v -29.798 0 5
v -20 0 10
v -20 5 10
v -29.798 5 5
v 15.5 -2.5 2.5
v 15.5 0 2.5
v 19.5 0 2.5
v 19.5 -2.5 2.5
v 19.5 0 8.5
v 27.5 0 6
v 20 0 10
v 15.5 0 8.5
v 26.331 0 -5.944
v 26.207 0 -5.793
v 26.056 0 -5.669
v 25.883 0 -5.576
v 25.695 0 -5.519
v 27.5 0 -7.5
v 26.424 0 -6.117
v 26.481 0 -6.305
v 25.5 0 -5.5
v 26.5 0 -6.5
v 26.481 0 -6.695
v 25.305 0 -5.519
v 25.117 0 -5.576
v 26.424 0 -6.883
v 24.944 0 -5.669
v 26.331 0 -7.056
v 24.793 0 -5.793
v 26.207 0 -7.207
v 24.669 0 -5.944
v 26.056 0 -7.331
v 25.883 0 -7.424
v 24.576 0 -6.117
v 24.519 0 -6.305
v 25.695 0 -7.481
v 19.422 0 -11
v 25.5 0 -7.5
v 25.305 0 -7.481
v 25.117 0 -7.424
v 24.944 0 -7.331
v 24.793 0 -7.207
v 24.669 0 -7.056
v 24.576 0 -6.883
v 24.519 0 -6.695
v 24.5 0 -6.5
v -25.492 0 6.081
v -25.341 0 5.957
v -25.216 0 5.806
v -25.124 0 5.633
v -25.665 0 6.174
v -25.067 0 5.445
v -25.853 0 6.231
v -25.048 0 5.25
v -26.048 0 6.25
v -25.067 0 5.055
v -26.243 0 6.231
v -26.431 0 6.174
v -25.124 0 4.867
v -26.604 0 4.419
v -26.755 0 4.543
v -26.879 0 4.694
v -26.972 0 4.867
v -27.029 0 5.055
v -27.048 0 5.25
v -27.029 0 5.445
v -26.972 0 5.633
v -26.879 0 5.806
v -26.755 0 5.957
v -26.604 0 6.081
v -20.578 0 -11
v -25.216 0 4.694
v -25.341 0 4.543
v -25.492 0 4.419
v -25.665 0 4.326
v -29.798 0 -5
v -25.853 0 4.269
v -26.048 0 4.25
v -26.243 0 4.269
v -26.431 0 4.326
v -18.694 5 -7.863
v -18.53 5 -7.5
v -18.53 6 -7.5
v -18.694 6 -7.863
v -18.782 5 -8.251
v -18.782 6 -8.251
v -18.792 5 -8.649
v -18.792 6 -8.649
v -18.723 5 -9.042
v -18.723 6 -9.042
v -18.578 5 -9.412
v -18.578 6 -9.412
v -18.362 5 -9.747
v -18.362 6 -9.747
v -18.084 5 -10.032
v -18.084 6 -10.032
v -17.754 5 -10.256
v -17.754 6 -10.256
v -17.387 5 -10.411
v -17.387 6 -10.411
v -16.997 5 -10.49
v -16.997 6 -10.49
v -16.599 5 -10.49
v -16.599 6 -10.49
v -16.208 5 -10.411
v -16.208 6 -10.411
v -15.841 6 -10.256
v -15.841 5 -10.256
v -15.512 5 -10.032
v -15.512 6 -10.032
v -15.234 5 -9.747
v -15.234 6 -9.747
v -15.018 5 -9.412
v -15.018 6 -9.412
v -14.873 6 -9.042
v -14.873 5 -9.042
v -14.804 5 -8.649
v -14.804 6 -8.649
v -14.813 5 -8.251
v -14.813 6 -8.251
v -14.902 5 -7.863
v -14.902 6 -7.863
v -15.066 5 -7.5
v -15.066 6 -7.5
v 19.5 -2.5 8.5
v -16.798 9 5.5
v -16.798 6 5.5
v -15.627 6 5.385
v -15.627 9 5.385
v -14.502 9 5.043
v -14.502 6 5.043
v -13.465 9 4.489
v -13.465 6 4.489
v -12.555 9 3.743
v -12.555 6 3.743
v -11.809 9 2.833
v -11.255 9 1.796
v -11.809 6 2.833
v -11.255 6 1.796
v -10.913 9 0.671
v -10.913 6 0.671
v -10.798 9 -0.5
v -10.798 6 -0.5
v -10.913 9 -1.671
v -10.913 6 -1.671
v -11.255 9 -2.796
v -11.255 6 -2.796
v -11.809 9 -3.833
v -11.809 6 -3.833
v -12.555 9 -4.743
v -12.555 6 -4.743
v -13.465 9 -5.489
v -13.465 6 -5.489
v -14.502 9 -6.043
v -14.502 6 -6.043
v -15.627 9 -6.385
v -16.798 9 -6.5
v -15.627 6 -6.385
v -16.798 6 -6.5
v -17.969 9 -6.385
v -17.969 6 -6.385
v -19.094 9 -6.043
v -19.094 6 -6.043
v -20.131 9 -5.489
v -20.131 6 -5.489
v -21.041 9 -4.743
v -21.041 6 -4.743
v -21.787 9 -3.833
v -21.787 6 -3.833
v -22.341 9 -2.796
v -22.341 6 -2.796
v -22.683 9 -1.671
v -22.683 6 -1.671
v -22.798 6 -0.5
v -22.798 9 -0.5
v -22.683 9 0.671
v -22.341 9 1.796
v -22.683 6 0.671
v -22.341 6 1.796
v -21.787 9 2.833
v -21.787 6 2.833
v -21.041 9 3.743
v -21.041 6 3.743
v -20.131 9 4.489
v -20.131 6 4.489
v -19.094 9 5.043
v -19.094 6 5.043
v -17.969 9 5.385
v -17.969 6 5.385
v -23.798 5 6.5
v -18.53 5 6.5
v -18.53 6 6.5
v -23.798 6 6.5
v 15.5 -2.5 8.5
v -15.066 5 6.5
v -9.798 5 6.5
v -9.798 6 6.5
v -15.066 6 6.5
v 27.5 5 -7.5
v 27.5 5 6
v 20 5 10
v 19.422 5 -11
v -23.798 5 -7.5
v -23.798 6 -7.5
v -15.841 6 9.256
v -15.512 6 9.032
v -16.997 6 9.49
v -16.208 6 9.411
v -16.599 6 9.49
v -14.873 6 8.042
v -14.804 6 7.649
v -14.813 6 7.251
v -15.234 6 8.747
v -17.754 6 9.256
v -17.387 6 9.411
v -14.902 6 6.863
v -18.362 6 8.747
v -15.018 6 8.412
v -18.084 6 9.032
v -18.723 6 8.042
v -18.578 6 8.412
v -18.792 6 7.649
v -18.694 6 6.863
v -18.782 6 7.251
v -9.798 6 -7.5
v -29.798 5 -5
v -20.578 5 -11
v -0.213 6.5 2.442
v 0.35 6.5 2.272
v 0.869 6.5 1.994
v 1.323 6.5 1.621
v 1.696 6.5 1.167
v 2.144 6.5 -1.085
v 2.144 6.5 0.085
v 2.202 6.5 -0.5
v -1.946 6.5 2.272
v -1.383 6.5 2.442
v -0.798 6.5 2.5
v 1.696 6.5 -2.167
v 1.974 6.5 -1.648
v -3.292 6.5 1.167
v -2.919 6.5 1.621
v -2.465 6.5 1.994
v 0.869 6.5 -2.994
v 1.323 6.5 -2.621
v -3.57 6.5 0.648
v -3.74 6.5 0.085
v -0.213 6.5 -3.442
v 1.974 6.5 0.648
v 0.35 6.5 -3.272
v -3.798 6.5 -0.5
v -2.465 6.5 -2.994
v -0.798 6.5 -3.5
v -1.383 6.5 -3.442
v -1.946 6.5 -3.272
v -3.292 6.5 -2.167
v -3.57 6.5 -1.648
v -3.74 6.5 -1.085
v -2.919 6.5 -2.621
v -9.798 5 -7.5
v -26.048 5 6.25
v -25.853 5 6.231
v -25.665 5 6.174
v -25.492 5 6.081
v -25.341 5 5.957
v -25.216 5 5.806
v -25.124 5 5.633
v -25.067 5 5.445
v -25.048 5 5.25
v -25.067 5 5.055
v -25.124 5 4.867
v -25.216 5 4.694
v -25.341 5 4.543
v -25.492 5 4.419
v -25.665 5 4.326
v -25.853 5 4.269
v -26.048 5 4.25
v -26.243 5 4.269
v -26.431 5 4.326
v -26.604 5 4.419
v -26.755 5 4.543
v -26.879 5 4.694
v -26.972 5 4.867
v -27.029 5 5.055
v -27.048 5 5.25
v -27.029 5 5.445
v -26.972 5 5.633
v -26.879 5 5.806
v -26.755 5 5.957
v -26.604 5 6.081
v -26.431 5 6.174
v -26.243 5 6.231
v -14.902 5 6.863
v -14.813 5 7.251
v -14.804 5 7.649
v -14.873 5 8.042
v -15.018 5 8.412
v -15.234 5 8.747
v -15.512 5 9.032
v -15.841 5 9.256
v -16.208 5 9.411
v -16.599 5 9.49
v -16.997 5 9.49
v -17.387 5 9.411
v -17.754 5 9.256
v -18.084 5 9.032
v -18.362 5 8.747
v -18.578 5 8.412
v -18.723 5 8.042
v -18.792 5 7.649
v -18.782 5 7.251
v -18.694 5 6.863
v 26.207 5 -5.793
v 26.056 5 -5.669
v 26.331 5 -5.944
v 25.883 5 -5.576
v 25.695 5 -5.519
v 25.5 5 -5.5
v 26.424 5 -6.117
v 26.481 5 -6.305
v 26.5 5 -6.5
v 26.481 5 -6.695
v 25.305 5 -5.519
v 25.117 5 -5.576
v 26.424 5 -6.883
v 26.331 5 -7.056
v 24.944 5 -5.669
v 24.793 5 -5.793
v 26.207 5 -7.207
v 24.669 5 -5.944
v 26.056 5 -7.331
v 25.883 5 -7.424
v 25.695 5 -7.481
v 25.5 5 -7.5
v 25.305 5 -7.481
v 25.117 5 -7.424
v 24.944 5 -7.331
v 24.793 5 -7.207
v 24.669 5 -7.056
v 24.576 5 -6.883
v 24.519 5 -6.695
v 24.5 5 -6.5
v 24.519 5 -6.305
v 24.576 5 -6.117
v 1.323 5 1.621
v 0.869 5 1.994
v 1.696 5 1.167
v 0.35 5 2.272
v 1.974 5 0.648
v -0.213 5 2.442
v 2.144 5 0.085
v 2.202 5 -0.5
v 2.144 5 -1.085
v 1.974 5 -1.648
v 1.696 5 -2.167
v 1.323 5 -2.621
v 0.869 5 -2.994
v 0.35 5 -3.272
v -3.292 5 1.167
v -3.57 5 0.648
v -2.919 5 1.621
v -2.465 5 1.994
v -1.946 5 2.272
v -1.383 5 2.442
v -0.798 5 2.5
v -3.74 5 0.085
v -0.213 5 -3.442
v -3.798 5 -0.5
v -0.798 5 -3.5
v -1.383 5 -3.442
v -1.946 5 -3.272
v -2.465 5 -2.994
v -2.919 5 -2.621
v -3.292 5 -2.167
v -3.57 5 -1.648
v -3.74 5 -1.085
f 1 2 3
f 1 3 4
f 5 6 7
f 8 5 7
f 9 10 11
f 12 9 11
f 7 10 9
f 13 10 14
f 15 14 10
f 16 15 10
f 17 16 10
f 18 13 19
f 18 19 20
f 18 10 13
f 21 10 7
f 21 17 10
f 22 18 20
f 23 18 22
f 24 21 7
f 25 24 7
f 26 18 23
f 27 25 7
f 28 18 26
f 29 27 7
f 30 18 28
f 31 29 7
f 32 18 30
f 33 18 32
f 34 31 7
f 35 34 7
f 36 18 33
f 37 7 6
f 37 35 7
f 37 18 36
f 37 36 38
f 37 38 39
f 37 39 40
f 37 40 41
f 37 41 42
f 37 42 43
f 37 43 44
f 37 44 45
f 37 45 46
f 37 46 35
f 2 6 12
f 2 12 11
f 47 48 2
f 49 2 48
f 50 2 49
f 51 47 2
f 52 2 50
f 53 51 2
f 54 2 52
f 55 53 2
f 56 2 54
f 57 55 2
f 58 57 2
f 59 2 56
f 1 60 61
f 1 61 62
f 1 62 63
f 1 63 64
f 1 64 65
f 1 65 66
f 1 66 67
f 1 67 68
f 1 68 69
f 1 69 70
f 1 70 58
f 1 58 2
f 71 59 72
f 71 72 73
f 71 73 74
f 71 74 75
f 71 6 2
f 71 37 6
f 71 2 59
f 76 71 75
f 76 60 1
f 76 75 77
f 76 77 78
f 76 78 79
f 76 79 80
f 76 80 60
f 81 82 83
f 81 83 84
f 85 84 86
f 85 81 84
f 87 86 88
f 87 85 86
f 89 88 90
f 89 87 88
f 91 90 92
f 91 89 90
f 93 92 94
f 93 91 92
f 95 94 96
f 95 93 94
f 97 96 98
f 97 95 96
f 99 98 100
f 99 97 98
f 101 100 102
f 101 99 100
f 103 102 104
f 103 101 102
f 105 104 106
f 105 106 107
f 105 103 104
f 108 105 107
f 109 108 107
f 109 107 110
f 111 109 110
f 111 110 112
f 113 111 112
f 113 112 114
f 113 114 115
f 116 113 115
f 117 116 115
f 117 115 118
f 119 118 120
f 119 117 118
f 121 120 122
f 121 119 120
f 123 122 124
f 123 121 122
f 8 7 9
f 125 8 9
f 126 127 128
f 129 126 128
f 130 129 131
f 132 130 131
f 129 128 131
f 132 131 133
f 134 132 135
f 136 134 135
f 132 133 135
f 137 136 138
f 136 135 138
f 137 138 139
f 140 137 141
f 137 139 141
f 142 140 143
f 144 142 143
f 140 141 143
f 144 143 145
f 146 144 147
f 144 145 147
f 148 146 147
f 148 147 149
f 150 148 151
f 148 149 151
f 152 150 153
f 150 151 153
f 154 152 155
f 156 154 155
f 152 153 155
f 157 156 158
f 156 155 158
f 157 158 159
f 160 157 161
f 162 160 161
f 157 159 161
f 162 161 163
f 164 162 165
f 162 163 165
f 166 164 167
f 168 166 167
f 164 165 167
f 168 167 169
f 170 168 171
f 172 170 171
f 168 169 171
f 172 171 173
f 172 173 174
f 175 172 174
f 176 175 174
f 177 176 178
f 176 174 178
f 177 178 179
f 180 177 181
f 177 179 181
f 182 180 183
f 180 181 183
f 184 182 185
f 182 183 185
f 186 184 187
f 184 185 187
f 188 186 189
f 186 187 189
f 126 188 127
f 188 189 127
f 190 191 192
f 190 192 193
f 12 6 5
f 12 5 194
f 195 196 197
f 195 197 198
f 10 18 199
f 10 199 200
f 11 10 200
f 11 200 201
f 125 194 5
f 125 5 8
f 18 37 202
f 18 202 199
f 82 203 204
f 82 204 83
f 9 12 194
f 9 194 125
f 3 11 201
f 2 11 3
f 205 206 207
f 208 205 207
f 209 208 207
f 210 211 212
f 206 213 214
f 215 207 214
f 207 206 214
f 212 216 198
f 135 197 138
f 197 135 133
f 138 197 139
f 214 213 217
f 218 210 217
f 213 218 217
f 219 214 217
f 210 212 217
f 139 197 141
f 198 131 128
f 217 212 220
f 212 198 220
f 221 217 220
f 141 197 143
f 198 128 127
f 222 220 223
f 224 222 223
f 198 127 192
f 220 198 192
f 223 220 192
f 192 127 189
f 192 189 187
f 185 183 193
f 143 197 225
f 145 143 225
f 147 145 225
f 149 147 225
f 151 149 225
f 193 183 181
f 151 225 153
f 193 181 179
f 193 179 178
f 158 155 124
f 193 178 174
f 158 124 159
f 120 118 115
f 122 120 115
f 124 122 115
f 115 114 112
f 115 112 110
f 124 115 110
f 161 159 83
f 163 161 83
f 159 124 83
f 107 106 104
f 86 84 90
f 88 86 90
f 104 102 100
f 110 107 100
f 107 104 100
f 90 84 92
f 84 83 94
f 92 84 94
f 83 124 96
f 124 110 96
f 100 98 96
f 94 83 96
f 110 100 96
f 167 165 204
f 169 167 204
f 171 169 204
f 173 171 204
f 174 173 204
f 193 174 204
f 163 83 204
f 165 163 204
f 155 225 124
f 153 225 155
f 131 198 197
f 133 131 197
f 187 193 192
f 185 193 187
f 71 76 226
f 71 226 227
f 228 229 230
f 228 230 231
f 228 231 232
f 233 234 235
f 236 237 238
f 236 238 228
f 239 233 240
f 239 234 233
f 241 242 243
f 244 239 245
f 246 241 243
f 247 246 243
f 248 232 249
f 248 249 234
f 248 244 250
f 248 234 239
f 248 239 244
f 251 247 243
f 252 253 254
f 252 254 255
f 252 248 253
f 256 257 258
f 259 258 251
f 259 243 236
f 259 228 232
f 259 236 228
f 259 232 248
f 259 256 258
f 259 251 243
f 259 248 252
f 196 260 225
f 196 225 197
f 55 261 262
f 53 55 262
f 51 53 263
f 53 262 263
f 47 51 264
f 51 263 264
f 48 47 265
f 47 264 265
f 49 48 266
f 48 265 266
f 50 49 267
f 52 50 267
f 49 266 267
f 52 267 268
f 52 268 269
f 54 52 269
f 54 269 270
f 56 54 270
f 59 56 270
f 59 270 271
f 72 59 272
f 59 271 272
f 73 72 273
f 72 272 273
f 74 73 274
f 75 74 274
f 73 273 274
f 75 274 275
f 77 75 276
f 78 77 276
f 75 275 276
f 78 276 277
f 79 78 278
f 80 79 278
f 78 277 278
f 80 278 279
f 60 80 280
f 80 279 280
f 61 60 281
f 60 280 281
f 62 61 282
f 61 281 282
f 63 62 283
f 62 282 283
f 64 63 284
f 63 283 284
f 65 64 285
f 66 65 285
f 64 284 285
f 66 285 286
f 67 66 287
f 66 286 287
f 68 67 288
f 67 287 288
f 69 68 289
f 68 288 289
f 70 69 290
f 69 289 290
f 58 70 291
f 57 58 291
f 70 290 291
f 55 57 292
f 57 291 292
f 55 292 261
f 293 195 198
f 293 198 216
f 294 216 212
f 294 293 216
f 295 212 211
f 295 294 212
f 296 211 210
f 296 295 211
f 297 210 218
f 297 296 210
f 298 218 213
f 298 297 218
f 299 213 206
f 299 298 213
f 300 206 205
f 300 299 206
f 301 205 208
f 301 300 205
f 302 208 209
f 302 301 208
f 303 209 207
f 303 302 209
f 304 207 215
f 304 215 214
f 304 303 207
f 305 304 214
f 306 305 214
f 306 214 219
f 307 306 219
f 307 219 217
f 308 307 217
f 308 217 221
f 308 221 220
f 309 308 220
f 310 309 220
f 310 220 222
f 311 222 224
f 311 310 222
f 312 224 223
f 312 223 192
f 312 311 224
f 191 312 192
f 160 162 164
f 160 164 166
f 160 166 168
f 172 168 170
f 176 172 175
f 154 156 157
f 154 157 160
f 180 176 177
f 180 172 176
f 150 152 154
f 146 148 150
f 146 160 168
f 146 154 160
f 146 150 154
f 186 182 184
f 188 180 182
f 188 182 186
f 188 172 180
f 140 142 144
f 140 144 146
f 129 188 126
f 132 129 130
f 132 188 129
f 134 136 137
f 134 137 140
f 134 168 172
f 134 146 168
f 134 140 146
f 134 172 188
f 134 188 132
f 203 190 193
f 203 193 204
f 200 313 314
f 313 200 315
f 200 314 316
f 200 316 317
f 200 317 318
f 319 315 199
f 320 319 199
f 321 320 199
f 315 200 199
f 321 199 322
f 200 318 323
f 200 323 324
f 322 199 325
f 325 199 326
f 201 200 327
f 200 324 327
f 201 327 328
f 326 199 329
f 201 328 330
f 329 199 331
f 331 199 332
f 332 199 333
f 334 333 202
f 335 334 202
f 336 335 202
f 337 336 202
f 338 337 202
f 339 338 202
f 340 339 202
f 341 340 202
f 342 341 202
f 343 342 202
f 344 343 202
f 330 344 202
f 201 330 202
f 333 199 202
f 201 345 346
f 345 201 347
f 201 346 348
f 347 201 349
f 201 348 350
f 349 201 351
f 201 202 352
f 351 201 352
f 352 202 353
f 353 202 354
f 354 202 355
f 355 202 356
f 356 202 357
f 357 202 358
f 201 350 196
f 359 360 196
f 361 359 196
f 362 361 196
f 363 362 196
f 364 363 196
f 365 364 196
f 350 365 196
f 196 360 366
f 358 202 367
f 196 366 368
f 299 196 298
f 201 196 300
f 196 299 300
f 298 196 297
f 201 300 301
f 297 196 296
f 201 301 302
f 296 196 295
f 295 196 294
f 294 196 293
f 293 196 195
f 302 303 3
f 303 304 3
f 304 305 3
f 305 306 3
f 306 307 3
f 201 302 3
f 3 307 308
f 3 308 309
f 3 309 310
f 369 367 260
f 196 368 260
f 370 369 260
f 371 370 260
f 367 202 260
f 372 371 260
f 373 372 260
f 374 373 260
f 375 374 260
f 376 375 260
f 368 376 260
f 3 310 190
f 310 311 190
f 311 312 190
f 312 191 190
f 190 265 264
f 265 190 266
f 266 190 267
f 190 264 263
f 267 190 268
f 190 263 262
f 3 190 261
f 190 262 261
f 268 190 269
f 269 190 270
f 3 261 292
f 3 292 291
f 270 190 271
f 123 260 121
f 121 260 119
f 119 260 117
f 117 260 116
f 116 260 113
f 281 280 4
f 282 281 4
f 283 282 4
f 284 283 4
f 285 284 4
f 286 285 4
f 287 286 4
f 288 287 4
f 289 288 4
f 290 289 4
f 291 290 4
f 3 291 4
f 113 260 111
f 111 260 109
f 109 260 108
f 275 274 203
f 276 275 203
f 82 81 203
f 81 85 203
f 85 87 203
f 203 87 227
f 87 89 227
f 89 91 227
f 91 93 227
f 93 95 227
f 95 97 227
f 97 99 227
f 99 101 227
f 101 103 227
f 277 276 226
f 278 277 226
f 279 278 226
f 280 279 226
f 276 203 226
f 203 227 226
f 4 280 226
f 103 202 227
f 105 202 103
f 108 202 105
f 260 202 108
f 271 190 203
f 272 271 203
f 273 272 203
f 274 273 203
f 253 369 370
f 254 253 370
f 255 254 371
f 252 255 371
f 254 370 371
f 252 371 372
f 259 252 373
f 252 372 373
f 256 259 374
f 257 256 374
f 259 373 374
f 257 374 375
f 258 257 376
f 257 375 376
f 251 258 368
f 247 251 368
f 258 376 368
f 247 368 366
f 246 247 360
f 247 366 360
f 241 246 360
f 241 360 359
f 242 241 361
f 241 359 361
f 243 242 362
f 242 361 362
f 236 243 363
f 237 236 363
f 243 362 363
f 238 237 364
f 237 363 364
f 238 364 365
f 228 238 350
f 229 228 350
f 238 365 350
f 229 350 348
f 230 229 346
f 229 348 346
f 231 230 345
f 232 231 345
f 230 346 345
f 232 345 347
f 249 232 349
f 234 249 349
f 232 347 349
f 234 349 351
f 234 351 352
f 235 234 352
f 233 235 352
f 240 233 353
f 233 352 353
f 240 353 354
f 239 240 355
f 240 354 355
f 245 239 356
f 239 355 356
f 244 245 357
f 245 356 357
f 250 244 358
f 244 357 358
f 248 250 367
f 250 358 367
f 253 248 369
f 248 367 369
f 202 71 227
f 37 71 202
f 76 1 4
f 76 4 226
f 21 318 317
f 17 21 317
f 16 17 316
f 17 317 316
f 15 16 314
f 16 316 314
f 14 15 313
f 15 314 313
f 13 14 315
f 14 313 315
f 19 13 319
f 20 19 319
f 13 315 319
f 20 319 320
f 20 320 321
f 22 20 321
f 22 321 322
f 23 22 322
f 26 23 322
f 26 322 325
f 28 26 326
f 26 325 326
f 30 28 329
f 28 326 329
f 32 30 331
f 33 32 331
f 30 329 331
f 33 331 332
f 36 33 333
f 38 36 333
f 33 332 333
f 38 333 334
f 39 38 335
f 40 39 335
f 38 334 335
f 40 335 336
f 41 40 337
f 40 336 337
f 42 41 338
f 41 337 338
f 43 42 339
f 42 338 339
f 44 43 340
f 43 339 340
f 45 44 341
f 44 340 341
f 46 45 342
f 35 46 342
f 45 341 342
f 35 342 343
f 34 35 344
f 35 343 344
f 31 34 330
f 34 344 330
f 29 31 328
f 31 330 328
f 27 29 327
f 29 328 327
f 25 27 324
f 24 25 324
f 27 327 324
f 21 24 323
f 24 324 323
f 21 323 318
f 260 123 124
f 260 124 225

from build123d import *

# Parameters (mm, degrees)
EXTRUDE_1_DEPTH     = 5
EXTRUDE_2_DEPTH     = 1
SKETCH_3_R          = 6
EXTRUDE_3_DEPTH     = 3
SKETCH_4_R          = 3
EXTRUDE_4_DEPTH     = 1.5
SKETCH_6_W          = 4
SKETCH_6_H          = 6
EXTRUDE_5_DEPTH     = 2.5
SKETCH_7_R          = 1
CUT_EXTRUDE_1_DEPTH = 5


with BuildPart() as part:
    # Эскиз1 → Бобышка-Вытянуть1 (new body)
    with BuildSketch(Plane(origin=(0, 0, 0), x_dir=(1, 0, 0), z_dir=(0, 1, 0))):
        Polygon((-29.797958971, -5), (-29.797958971, 5), (-20.578414514, 11), (19.421585486, 11), (27.5, 7.5), (27.5, -6), (20, -10), (-20, -10), align=None)
    extrude(amount=EXTRUDE_1_DEPTH)

    # Эскиз2 → Бобышка-Вытянуть2 (add)
    with BuildSketch(Plane(origin=(0, 5, 0), x_dir=(1, 0, 0), z_dir=(0, 1, 0))):
        with BuildLine():
            Line((-23.797958971, 7.5), (-18.530009779, 7.5))
            ThreePointArc((-18.530009779, 7.5), (-16.797958971, 10.5), (-15.065908164, 7.5))
            Line((-15.065908164, 7.5), (-9.797958971, 7.5))
            Line((-9.797958971, 7.5), (-9.797958971, -6.5))
            Line((-9.797958971, -6.5), (-15.065908164, -6.5))
            ThreePointArc((-15.065908164, -6.5), (-16.797958971, -9.5), (-18.530009779, -6.5))
            Line((-18.530009779, -6.5), (-23.797958971, -6.5))
            Line((-23.797958971, -6.5), (-23.797958971, 7.5))
        make_face()
    extrude(amount=EXTRUDE_2_DEPTH)

    # Эскиз3 → Бобышка-Вытянуть3 (add)
    with BuildSketch(Plane(origin=(0, 6, 0), x_dir=(1, 0, 0), z_dir=(0, 1, 0))):
        with Locations(Location((-16.797958971, 0.5, 0), (0, 0, 270))):
            Circle(SKETCH_3_R)
    extrude(amount=EXTRUDE_3_DEPTH)

    # Эскиз4 → Бобышка-Вытянуть4 (add)
    with BuildSketch(Plane(origin=(0, 5, 0), x_dir=(1, 0, 0), z_dir=(0, 1, 0))):
        with Locations(Location((-0.797958971, 0.5, 0), (0, 0, 90))):
            Circle(SKETCH_4_R)
    extrude(amount=EXTRUDE_4_DEPTH)

    # Эскиз6 → Бобышка-Вытянуть5 (add)
    with BuildSketch(Plane.XZ):
        with Locations((17.5, 5.5)):
            Rectangle(SKETCH_6_W, SKETCH_6_H)
    extrude(amount=EXTRUDE_5_DEPTH)

    # Эскиз7 → Вырез-Вытянуть1 (cut)
    with BuildSketch(Plane(origin=(0, 5, 0), x_dir=(1, 0, 0), z_dir=(0, 1, 0))):
        with Locations(Location((-26.047958971, -5.25, 0), (0, 0, 270))):
            Circle(SKETCH_7_R)
        with Locations(Location((25.5, 6.5, 0), (0, 0, 270))):
            Circle(SKETCH_7_R)
    extrude(amount=-CUT_EXTRUDE_1_DEPTH, mode=Mode.SUBTRACT)


solid = part.part
